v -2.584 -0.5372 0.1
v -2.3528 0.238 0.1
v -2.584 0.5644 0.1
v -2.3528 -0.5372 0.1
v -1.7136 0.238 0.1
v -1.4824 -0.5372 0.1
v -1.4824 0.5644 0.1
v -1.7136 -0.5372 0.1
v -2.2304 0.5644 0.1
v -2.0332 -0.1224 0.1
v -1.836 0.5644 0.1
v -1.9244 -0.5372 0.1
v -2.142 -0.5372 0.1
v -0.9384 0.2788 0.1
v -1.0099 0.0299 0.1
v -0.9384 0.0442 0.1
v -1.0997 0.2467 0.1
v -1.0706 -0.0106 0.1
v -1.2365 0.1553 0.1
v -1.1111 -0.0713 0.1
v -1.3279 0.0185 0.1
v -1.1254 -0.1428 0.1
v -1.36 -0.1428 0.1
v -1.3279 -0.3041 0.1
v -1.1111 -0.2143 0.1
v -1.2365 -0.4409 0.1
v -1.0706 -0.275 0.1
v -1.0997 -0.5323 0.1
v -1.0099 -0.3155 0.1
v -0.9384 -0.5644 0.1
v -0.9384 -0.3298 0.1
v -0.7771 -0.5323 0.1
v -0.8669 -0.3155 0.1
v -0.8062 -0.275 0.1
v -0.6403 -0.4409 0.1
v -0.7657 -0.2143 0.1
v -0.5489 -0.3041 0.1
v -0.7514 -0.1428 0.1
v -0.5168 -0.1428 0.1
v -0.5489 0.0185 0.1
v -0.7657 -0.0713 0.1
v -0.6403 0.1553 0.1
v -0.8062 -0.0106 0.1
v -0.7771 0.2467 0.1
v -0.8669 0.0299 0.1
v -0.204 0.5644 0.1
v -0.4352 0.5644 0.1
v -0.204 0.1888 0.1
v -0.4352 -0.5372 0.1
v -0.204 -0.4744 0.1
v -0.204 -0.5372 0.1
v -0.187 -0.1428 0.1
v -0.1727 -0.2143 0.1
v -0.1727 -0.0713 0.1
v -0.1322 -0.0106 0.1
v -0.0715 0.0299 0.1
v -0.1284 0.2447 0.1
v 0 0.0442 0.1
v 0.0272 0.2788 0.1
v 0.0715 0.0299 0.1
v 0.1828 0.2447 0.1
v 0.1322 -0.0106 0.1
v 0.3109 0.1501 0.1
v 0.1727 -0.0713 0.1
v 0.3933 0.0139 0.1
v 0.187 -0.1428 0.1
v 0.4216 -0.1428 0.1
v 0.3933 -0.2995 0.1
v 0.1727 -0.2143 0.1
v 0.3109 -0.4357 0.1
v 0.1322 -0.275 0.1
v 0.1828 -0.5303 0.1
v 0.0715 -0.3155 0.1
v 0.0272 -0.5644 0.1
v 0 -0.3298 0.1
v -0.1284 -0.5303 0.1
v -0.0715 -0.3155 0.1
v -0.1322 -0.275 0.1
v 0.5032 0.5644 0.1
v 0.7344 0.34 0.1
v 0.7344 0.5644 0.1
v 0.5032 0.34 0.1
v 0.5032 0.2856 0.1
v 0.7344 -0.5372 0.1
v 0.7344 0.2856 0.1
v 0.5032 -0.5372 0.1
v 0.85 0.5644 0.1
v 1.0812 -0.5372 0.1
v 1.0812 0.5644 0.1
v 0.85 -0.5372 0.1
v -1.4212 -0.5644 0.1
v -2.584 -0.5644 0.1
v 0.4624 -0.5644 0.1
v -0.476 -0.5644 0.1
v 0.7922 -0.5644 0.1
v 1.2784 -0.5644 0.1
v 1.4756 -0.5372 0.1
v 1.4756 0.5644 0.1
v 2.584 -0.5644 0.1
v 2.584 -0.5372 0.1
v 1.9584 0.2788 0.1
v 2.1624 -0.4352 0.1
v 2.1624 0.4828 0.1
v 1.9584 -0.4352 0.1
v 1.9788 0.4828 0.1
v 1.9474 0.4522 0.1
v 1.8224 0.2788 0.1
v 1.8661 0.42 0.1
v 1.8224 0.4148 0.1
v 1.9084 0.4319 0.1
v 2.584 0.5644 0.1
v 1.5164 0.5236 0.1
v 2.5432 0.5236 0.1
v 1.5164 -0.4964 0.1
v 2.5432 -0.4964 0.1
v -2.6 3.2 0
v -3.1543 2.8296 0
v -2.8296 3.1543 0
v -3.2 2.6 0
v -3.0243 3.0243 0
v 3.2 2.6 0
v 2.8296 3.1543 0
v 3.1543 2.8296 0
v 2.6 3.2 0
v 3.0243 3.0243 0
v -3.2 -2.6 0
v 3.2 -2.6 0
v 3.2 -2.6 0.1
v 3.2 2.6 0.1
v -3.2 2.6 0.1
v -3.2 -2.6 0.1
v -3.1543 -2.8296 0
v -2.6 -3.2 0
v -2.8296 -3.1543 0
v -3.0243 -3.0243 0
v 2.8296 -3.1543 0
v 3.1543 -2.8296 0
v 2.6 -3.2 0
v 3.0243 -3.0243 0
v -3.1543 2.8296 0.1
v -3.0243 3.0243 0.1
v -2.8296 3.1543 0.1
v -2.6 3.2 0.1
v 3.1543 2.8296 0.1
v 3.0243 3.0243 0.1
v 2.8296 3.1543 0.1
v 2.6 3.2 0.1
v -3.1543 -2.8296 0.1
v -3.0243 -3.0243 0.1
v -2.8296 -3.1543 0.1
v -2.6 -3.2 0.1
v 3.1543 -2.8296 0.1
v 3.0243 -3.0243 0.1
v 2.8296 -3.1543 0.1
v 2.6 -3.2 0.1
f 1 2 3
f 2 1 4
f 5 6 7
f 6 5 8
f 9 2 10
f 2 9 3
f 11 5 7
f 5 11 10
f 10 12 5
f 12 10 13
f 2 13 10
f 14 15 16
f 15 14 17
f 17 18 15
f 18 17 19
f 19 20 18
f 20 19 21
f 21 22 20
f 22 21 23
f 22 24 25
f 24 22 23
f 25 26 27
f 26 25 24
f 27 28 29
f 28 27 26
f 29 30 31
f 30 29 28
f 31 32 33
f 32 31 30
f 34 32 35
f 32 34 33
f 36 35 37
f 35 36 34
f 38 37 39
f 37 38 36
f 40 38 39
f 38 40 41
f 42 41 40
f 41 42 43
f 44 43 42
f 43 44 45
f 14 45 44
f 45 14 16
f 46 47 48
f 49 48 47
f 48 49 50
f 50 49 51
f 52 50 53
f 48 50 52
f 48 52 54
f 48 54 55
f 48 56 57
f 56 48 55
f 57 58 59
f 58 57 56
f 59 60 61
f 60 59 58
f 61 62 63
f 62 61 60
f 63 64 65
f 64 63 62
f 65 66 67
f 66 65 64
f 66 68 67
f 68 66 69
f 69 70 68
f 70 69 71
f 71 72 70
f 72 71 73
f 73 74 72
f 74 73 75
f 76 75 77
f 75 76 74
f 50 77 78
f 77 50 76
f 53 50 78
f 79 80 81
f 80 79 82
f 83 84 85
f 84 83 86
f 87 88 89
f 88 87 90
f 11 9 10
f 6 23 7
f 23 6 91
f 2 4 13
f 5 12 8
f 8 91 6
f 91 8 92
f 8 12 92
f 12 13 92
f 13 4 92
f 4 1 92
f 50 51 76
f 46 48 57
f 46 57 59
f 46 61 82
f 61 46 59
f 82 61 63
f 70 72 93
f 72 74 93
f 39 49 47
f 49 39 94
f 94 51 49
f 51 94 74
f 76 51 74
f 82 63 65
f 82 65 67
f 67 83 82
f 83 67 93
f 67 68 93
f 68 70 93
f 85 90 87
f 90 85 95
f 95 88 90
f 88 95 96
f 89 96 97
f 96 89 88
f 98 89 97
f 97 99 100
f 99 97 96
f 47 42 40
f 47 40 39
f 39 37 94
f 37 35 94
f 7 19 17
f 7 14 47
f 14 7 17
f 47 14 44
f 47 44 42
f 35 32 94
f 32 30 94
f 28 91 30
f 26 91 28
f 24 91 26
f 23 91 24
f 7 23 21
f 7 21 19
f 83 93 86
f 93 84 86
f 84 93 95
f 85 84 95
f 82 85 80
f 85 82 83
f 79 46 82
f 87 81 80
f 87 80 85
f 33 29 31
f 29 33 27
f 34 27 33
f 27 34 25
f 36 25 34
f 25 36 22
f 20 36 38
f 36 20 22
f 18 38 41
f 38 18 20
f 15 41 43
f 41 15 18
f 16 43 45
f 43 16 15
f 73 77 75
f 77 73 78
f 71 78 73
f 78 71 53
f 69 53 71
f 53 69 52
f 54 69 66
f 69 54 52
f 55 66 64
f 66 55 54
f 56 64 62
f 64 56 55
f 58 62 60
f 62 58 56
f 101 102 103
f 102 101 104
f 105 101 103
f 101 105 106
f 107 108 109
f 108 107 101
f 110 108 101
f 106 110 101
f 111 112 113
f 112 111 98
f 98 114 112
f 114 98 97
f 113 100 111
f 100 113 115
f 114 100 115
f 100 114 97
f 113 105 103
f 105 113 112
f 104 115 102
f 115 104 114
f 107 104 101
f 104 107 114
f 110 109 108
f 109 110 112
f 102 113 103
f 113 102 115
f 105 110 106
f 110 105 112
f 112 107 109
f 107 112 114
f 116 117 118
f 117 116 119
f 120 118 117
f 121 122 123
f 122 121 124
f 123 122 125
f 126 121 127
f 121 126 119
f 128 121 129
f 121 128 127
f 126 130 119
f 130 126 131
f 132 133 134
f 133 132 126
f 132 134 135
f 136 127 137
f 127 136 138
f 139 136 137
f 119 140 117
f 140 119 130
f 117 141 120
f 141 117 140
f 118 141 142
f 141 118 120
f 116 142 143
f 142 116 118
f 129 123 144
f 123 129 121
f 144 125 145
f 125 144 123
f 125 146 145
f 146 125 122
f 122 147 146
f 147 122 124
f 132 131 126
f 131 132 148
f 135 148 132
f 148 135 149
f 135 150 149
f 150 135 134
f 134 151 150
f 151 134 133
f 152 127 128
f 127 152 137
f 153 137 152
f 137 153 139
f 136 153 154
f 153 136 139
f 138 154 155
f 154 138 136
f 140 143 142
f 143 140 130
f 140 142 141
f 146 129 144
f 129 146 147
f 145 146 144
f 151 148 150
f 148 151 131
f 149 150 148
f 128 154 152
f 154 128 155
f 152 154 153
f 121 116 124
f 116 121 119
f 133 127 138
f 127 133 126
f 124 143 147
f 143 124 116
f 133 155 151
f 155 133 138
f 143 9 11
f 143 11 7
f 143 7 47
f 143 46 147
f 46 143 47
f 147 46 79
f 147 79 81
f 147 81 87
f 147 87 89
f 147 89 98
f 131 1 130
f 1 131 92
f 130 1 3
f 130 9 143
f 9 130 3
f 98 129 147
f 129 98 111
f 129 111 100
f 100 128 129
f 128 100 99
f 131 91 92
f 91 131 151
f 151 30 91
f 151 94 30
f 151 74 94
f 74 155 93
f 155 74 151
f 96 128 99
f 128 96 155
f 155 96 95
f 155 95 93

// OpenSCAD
// file: ../p/logo-mobil1-text.scad
use <../lib.scad>
function ldraw_lib__logo_mobil1_text() = [
// 0 Logo Mobil without Number Monocolor
// 0 Name: logo-mobil1-text.dat
// 0 Author: Massimo Maso [Sirio]
// 0 !LDRAW_ORG Primitive UPDATE 2025-03
// 0 !LICENSE Licensed under CC BY 4.0 : see CAreadme.txt
// 
// 0 !HELP Exact dimensions X = 3.8; Z = 0.83
// 
// 0 BFC CERTIFY CCW
  [0,"BFC","CERTIFY"],
  [0,"BFC","CCW"],
// 
// 0 !HISTORY 2025-03-30 [OrionP] Official Update 2025-03
// 
// 0 // Text "Mobil1"
// 0 // Letter "M"
// 4 16 -1.73 0 .175 -1.9 0 .415 -1.9 0 -.395 -1.73 0 -.395
  [4,16,-1.73,0,.175,-1.9,0,.415,-1.9,0,-.395,-1.73,0,-.395],
// 4 16 -1.26 0 .175 -1.26 0 -.395 -1.09 0 -.395 -1.09 0 .415
  [4,16,-1.26,0,.175,-1.26,0,-.395,-1.09,0,-.395,-1.09,0,.415],
// 4 16 -1.73 0 .175 -1.495 0 -.09 -1.64 0 .415 -1.9 0 .415
  [4,16,-1.73,0,.175,-1.495,0,-.09,-1.64,0,.415,-1.9,0,.415],
// 4 16 -1.26 0 .175 -1.09 0 .415 -1.35 0 .415 -1.495 0 -.09
  [4,16,-1.26,0,.175,-1.09,0,.415,-1.35,0,.415,-1.495,0,-.09],
// 4 16 -1.415 0 -.395 -1.26 0 .175 -1.495 0 -.09 -1.575 0 -.395
  [4,16,-1.415,0,-.395,-1.26,0,.175,-1.495,0,-.09,-1.575,0,-.395],
// 3 16 -1.73 0 .175 -1.575 0 -.395 -1.495 0 -.09
  [3,16,-1.73,0,.175,-1.575,0,-.395,-1.495,0,-.09],
// 0 // Letter "o"
// 4 16 -.69 0 .0325 -.69 0 .205 -.8086 0 .1814 -.7426 0 .022
  [4,16,-.69,0,.0325,-.69,0,.205,-.8086,0,.1814,-.7426,0,.022],
// 4 16 -.7426 0 .022 -.8086 0 .1814 -.9092 0 .1142 -.7872 0 -.0078
  [4,16,-.7426,0,.022,-.8086,0,.1814,-.9092,0,.1142,-.7872,0,-.0078],
// 4 16 -.7872 0 -.0078 -.9092 0 .1142 -.9764 0 .0136 -.817 0 -.0524
  [4,16,-.7872,0,-.0078,-.9092,0,.1142,-.9764,0,.0136,-.817,0,-.0524],
// 4 16 -.817 0 -.0524 -.9764 0 .0136 -1 0 -.105 -.8275 0 -.105
  [4,16,-.817,0,-.0524,-.9764,0,.0136,-1,0,-.105,-.8275,0,-.105],
// 4 16 -.8275 0 -.105 -1 0 -.105 -.9764 0 -.2236 -.817 0 -.1576
  [4,16,-.8275,0,-.105,-1,0,-.105,-.9764,0,-.2236,-.817,0,-.1576],
// 4 16 -.817 0 -.1576 -.9764 0 -.2236 -.9092 0 -.3242 -.7872 0 -.2022
  [4,16,-.817,0,-.1576,-.9764,0,-.2236,-.9092,0,-.3242,-.7872,0,-.2022],
// 4 16 -.7872 0 -.2022 -.9092 0 -.3242 -.8086 0 -.3914 -.7426 0 -.232
  [4,16,-.7872,0,-.2022,-.9092,0,-.3242,-.8086,0,-.3914,-.7426,0,-.232],
// 4 16 -.7426 0 -.232 -.8086 0 -.3914 -.69 0 -.415 -.69 0 -.2425
  [4,16,-.7426,0,-.232,-.8086,0,-.3914,-.69,0,-.415,-.69,0,-.2425],
// 4 16 -.69 0 -.2425 -.69 0 -.415 -.5714 0 -.3914 -.6374 0 -.232
  [4,16,-.69,0,-.2425,-.69,0,-.415,-.5714,0,-.3914,-.6374,0,-.232],
// 4 16 -.6374 0 -.232 -.5714 0 -.3914 -.4708 0 -.3242 -.5928 0 -.2022
  [4,16,-.6374,0,-.232,-.5714,0,-.3914,-.4708,0,-.3242,-.5928,0,-.2022],
// 4 16 -.5928 0 -.2022 -.4708 0 -.3242 -.4036 0 -.2236 -.563 0 -.1576
  [4,16,-.5928,0,-.2022,-.4708,0,-.3242,-.4036,0,-.2236,-.563,0,-.1576],
// 4 16 -.563 0 -.1576 -.4036 0 -.2236 -.38 0 -.105 -.5525 0 -.105
  [4,16,-.563,0,-.1576,-.4036,0,-.2236,-.38,0,-.105,-.5525,0,-.105],
// 4 16 -.5525 0 -.105 -.38 0 -.105 -.4036 0 .0136 -.563 0 -.0524
  [4,16,-.5525,0,-.105,-.38,0,-.105,-.4036,0,.0136,-.563,0,-.0524],
// 4 16 -.563 0 -.0524 -.4036 0 .0136 -.4708 0 .1142 -.5928 0 -.0078
  [4,16,-.563,0,-.0524,-.4036,0,.0136,-.4708,0,.1142,-.5928,0,-.0078],
// 4 16 -.5928 0 -.0078 -.4708 0 .1142 -.5714 0 .1814 -.6374 0 .022
  [4,16,-.5928,0,-.0078,-.4708,0,.1142,-.5714,0,.1814,-.6374,0,.022],
// 4 16 -.6374 0 .022 -.5714 0 .1814 -.69 0 .205 -.69 0 .0325
  [4,16,-.6374,0,.022,-.5714,0,.1814,-.69,0,.205,-.69,0,.0325],
// 0 // Letter "b"
// 3 16 -.15 0 .415 -.32 0 .415 -.15 0 .1388
  [3,16,-.15,0,.415,-.32,0,.415,-.15,0,.1388],
// 4 16 -.32 0 .415 -.32 0 -.395 -.15 0 -.3488 -.15 0 .1388
  [4,16,-.32,0,.415,-.32,0,-.395,-.15,0,-.3488,-.15,0,.1388],
// 3 16 -.15 0 -.3488 -.32 0 -.395 -.15 0 -.395
  [3,16,-.15,0,-.3488,-.32,0,-.395,-.15,0,-.395],
// 3 16 -.1375 0 -.105 -.15 0 -.3488 -.127 0 -.1576
  [3,16,-.1375,0,-.105,-.15,0,-.3488,-.127,0,-.1576],
// 3 16 -.15 0 .1388 -.15 0 -.3488 -.1375 0 -.105
  [3,16,-.15,0,.1388,-.15,0,-.3488,-.1375,0,-.105],
// 3 16 -.15 0 .1388 -.1375 0 -.105 -.127 0 -.0524
  [3,16,-.15,0,.1388,-.1375,0,-.105,-.127,0,-.0524],
// 3 16 -.15 0 .1388 -.127 0 -.0524 -.0972 0 -.0078
  [3,16,-.15,0,.1388,-.127,0,-.0524,-.0972,0,-.0078],
// 4 16 -.15 0 .1388 -.0972 0 -.0078 -.0526 0 .022 -.0944 0 .1799
  [4,16,-.15,0,.1388,-.0972,0,-.0078,-.0526,0,.022,-.0944,0,.1799],
// 4 16 -.0944 0 .1799 -.0526 0 .022 0 0 .0325 .02 0 .205
  [4,16,-.0944,0,.1799,-.0526,0,.022,0,0,.0325,.02,0,.205],
// 4 16 .02 0 .205 0 0 .0325 .0526 0 .022 .1344 0 .1799
  [4,16,.02,0,.205,0,0,.0325,.0526,0,.022,.1344,0,.1799],
// 4 16 .1344 0 .1799 .0526 0 .022 .0972 0 -.0078 .2286 0 .1104
  [4,16,.1344,0,.1799,.0526,0,.022,.0972,0,-.0078,.2286,0,.1104],
// 4 16 .2286 0 .1104 .0972 0 -.0078 .127 0 -.0524 .2892 0 .0102
  [4,16,.2286,0,.1104,.0972,0,-.0078,.127,0,-.0524,.2892,0,.0102],
// 4 16 .2892 0 .0102 .127 0 -.0524 .1375 0 -.105 .31 0 -.105
  [4,16,.2892,0,.0102,.127,0,-.0524,.1375,0,-.105,.31,0,-.105],
// 4 16 .31 0 -.105 .1375 0 -.105 .127 0 -.1576 .2892 0 -.2202
  [4,16,.31,0,-.105,.1375,0,-.105,.127,0,-.1576,.2892,0,-.2202],
// 4 16 .2892 0 -.2202 .127 0 -.1576 .0972 0 -.2022 .2286 0 -.3204
  [4,16,.2892,0,-.2202,.127,0,-.1576,.0972,0,-.2022,.2286,0,-.3204],
// 4 16 .2286 0 -.3204 .0972 0 -.2022 .0526 0 -.232 .1344 0 -.3899
  [4,16,.2286,0,-.3204,.0972,0,-.2022,.0526,0,-.232,.1344,0,-.3899],
// 4 16 .1344 0 -.3899 .0526 0 -.232 0 0 -.2425 .02 0 -.415
  [4,16,.1344,0,-.3899,.0526,0,-.232,0,0,-.2425,.02,0,-.415],
// 4 16 .02 0 -.415 0 0 -.2425 -.0526 0 -.232 -.0944 0 -.3899
  [4,16,.02,0,-.415,0,0,-.2425,-.0526,0,-.232,-.0944,0,-.3899],
// 4 16 -.0944 0 -.3899 -.0526 0 -.232 -.0972 0 -.2022 -.15 0 -.3488
  [4,16,-.0944,0,-.3899,-.0526,0,-.232,-.0972,0,-.2022,-.15,0,-.3488],
// 3 16 -.127 0 -.1576 -.15 0 -.3488 -.0972 0 -.2022
  [3,16,-.127,0,-.1576,-.15,0,-.3488,-.0972,0,-.2022],
// 0 // Letter "i"
// 4 16 .37 0 .415 .37 0 .25 .54 0 .25 .54 0 .415
  [4,16,.37,0,.415,.37,0,.25,.54,0,.25,.54,0,.415],
// 4 16 .37 0 .21 .37 0 -.395 .54 0 -.395 .54 0 .21
  [4,16,.37,0,.21,.37,0,-.395,.54,0,-.395,.54,0,.21],
// 0 // Letter "l"
// 4 16 .625 0 .415 .625 0 -.395 .795 0 -.395 .795 0 .415
  [4,16,.625,0,.415,.625,0,-.395,.795,0,-.395,.795,0,.415],
];
module ldraw_lib__logo_mobil1_text(step=0, col=false, unit=2/5, alt=false, line=0.2, solid=!$preview)
    makepoly(ldraw_lib__logo_mobil1_text(), step=step, col=col, unit=unit, alt=alt, line=line, solid=solid);
ldraw_lib__logo_mobil1_text(line=0.2);
// file: ../p/logo-mobil1-number.scad
use <../lib.scad>
function ldraw_lib__logo_mobil1_number() = [
// 0 Logo Mobil -  1 and Frame Monocolor
// 0 Name: logo-mobil1-number.dat
// 0 Author: Massimo Maso [Sirio]
// 0 !LDRAW_ORG Primitive UPDATE 2025-03
// 0 !LICENSE Licensed under CC BY 4.0 : see CAreadme.txt
// 
// 0 !HELP Exact dimensions X = 3.8; Z = 0.83
// 
// 0 BFC CERTIFY CCW
  [0,"BFC","CERTIFY"],
  [0,"BFC","CCW"],
// 
// 0 !HISTORY 2025-03-30 [OrionP] Official Update 2025-03
// 
// 0 // Number "1"
// 4 16 1.44 0 .205 1.44 0 -.32 1.59 0 -.32 1.59 0 .355
  [4,16,1.44,0,.205,1.44,0,-.32,1.59,0,-.32,1.59,0,.355],
// 4 16 1.44 0 .205 1.59 0 .355 1.455 0 .355 1.4319 0 .3325
  [4,16,1.44,0,.205,1.59,0,.355,1.455,0,.355,1.4319,0,.3325],
// 4 16 1.3721 0 .3088 1.34 0 .305 1.34 0 .205 1.44 0 .205
  [4,16,1.3721,0,.3088,1.34,0,.305,1.34,0,.205,1.44,0,.205],
// 3 16 1.4032 0 .3176 1.3721 0 .3088 1.44 0 .205
  [3,16,1.4032,0,.3176,1.3721,0,.3088,1.44,0,.205],
// 3 16 1.4319 0 .3325 1.4032 0 .3176 1.44 0 .205
  [3,16,1.4319,0,.3325,1.4032,0,.3176,1.44,0,.205],
// 0 // Frame
// 4 16 1.085 0 .415 1.115 0 .385 1.87 0 .385 1.9 0 .415
  [4,16,1.085,0,.415,1.115,0,.385,1.87,0,.385,1.9,0,.415],
// 4 16 1.085 0 .415 1.085 0 -.395 1.115 0 -.365 1.115 0 .385
  [4,16,1.085,0,.415,1.085,0,-.395,1.115,0,-.365,1.115,0,.385],
// 4 16 1.9 0 -.395 1.9 0 .415 1.87 0 .385 1.87 0 -.365
  [4,16,1.9,0,-.395,1.9,0,.415,1.87,0,.385,1.87,0,-.365],
// 4 16 1.9 0 -.395 1.87 0 -.365 1.115 0 -.365 1.085 0 -.395
  [4,16,1.9,0,-.395,1.87,0,-.365,1.115,0,-.365,1.085,0,-.395],
];
module ldraw_lib__logo_mobil1_number(step=0, col=false, unit=2/5, alt=false, line=0.2, solid=!$preview)
    makepoly(ldraw_lib__logo_mobil1_number(), step=step, col=col, unit=unit, alt=alt, line=line, solid=solid);
ldraw_lib__logo_mobil1_number(line=0.2);
// file: ../p/logo-mobil1-number-box.scad
use <../lib.scad>
function ldraw_lib__logo_mobil1_number_box() = [
// 0 Logo Mobil Box for Number  1
// 0 Name: logo-mobil1-number-box.dat
// 0 Author: Massimo Maso [Sirio]
// 0 !LDRAW_ORG Primitive UPDATE 2025-03
// 0 !LICENSE Licensed under CC BY 4.0 : see CAreadme.txt
// 
// 0 !HELP Exact dimensions X = 3.8; Z = 0.83
// 
// 0 BFC CERTIFY CCW
  [0,"BFC","CERTIFY"],
  [0,"BFC","CCW"],
// 
// 0 !HISTORY 2025-03-30 [OrionP] Official Update 2025-03
// 
// 0 // Inner rectangle
// 4 16 1.87 0 .385 1.115 0 .385 1.455 0 .355 1.59 0 .355
  [4,16,1.87,0,.385,1.115,0,.385,1.455,0,.355,1.59,0,.355],
// 4 16 1.44 0 -.32 1.115 0 -.365 1.87 0 -.365 1.59 0 -.32
  [4,16,1.44,0,-.32,1.115,0,-.365,1.87,0,-.365,1.59,0,-.32],
// 4 16 1.44 0 -.32 1.44 0 .205 1.34 0 .205 1.115 0 -.365
  [4,16,1.44,0,-.32,1.44,0,.205,1.34,0,.205,1.115,0,-.365],
// 4 16 1.115 0 .385 1.34 0 .305 1.3721 0 .3088 1.4032 0 .3176
  [4,16,1.115,0,.385,1.34,0,.305,1.3721,0,.3088,1.4032,0,.3176],
// 4 16 1.87 0 .385 1.59 0 .355 1.59 0 -.32 1.87 0 -.365
  [4,16,1.87,0,.385,1.59,0,.355,1.59,0,-.32,1.87,0,-.365],
// 4 16 1.115 0 .385 1.4032 0 .3176 1.4319 0 .3325 1.455 0 .355
  [4,16,1.115,0,.385,1.4032,0,.3176,1.4319,0,.3325,1.455,0,.355],
// 4 16 1.34 0 .205 1.34 0 .305 1.115 0 .385 1.115 0 -.365
  [4,16,1.34,0,.205,1.34,0,.305,1.115,0,.385,1.115,0,-.365],
];
module ldraw_lib__logo_mobil1_number_box(step=0, col=false, unit=2/5, alt=false, line=0.2, solid=!$preview)
    makepoly(ldraw_lib__logo_mobil1_number_box(), step=step, col=col, unit=unit, alt=alt, line=line, solid=solid);
ldraw_lib__logo_mobil1_number_box(line=0.2);
// file: ../p/box3u12.scad
use <../lib.scad>
function ldraw_lib__box3u12() = [
// 0 Box with 3 Parallel Faces without Any Edges
// 0 Name: box3u12.dat
// 0 Author: J.C. Tchang [tchang]
// 0 !LDRAW_ORG Primitive UPDATE 2014-02
// 0 !LICENSE Licensed under CC BY 4.0 : see CAreadme.txt
// 
// 0 BFC CERTIFY CCW
  [0,"BFC","CERTIFY"],
  [0,"BFC","CCW"],
// 
// 0 !HISTORY 2014-12-23 [PTadmin] Official Update 2014-02
// 
// 
// 4 16 -1 1 1 1 1 1 1 1 -1 -1 1 -1
  [4,16,-1,1,1,1,1,1,1,1,-1,-1,1,-1],
// 4 16 -1 1 1 -1 0 1 1 0 1 1 1 1
  [4,16,-1,1,1,-1,0,1,1,0,1,1,1,1],
// 4 16 1 1 -1 1 0 -1 -1 0 -1 -1 1 -1
  [4,16,1,1,-1,1,0,-1,-1,0,-1,-1,1,-1],
];
module ldraw_lib__box3u12(step=0, col=false, unit=2/5, alt=false, line=0.2, solid=!$preview)
    makepoly(ldraw_lib__box3u12(), step=step, col=col, unit=unit, alt=alt, line=line, solid=solid);
ldraw_lib__box3u12(line=0.2);
// file: ../p/1-4cyli.scad
use <../lib.scad>
function ldraw_lib__1_4cyli() = [
// 0 Cylinder 0.25
// 0 Name: 1-4cyli.dat
// 0 Author: James Jessiman
// 0 !LDRAW_ORG Primitive UPDATE 2012-01
// 0 !LICENSE Licensed under CC BY 4.0 : see CAreadme.txt
// 
// 0 BFC CERTIFY CCW
  [0,"BFC","CERTIFY"],
  [0,"BFC","CCW"],
// 
// 0 !HISTORY 2002-03-23 [sbliss] Added BFC statement.
// 0 !HISTORY 2002-04-25 [PTadmin] Official Update 2002-02
// 0 !HISTORY 2007-06-22 [PTadmin] Header formatted for Contributor Agreement
// 0 !HISTORY 2008-07-01 [PTadmin] Official Update 2008-01
// 0 !HISTORY 2012-02-16 [Philo] Changed to CCW
// 0 !HISTORY 2012-03-30 [PTadmin] Official Update 2012-01
// 
// 
// 4 16 1 1 0 0.9239 1 0.3827 0.9239 0 0.3827 1 0 0
  [4,16,1,1,0,0.9239,1,0.3827,0.9239,0,0.3827,1,0,0],
// 5 24 1 0 0 1 1 0 0.9239 0 0.3827 1 0 -1
  [5,24,1,0,0,1,1,0,0.9239,0,0.3827,1,0,-1],
// 4 16 0.9239 1 0.3827 0.7071 1 0.7071 0.7071 0 0.7071 0.9239 0 0.3827
  [4,16,0.9239,1,0.3827,0.7071,1,0.7071,0.7071,0,0.7071,0.9239,0,0.3827],
// 5 24 0.9239 0 0.3827 0.9239 1 0.3827 0.7071 0 0.7071 1 0 0
  [5,24,0.9239,0,0.3827,0.9239,1,0.3827,0.7071,0,0.7071,1,0,0],
// 4 16 0.7071 1 0.7071 0.3827 1 0.9239 0.3827 0 0.9239 0.7071 0 0.7071
  [4,16,0.7071,1,0.7071,0.3827,1,0.9239,0.3827,0,0.9239,0.7071,0,0.7071],
// 5 24 0.7071 0 0.7071 0.7071 1 0.7071 0.3827 0 0.9239 0.9239 0 0.3827
  [5,24,0.7071,0,0.7071,0.7071,1,0.7071,0.3827,0,0.9239,0.9239,0,0.3827],
// 4 16 0.3827 1 0.9239 0 1 1 0 0 1 0.3827 0 0.9239
  [4,16,0.3827,1,0.9239,0,1,1,0,0,1,0.3827,0,0.9239],
// 5 24 0.3827 0 0.9239 0.3827 1 0.9239 0 0 1 0.7071 0 0.7071
  [5,24,0.3827,0,0.9239,0.3827,1,0.9239,0,0,1,0.7071,0,0.7071],
// 5 24 0 0 1 0 1 1 0.3827 0 0.9239 -1 0 1
  [5,24,0,0,1,0,1,1,0.3827,0,0.9239,-1,0,1],
];
module ldraw_lib__1_4cyli(step=0, col=false, unit=2/5, alt=false, line=0.2, solid=!$preview)
    makepoly(ldraw_lib__1_4cyli(), step=step, col=col, unit=unit, alt=alt, line=line, solid=solid);
ldraw_lib__1_4cyli(line=0.2);
// file: ../p/1-4chrd.scad
use <../lib.scad>
function ldraw_lib__1_4chrd() = [
// 0 Chord 0.25
// 0 Name: 1-4chrd.dat
// 0 Author: Max Martin Richter [MMR1988]
// 0 !LDRAW_ORG Primitive UPDATE 2023-05
// 0 !LICENSE Licensed under CC BY 4.0 : see CAreadme.txt
// 
// 0 BFC CERTIFY CCW
  [0,"BFC","CERTIFY"],
  [0,"BFC","CCW"],
// 
// 0 !HISTORY 2004-04-22 [PTadmin] Official Update 2004-02
// 0 !HISTORY 2007-10-09 [PTadmin] Header formatted for Contributor Agreement
// 0 !HISTORY 2008-07-01 [PTadmin] Official Update 2008-01
// 0 !HISTORY 2012-08-02 [MMR1988] Re-creation with PrimGen2 and Rectifier
// 0 !HISTORY 2012-08-09 [PTadmin] Official Update 2012-02
// 0 !HISTORY 2023-10-27 [OrionP] Change author to MMR1988 from hafhead
// 0 !HISTORY 2023-10-31 [OrionP] Official Update 2023-05
// 
// 4 16 0.9239 0 0.3827 0.3827 0 0.9239 0 0 1 1 0 0
  [4,16,0.9239,0,0.3827,0.3827,0,0.9239,0,0,1,1,0,0],
// 3 16 0.7071 0 0.7071 0.3827 0 0.9239 0.9239 0 0.3827
  [3,16,0.7071,0,0.7071,0.3827,0,0.9239,0.9239,0,0.3827],
];
module ldraw_lib__1_4chrd(step=0, col=false, unit=2/5, alt=false, line=0.2, solid=!$preview)
    makepoly(ldraw_lib__1_4chrd(), step=step, col=col, unit=unit, alt=alt, line=line, solid=solid);
ldraw_lib__1_4chrd(line=0.2);
// main file
use <../lib.scad>
use <../p/1-4chrd.scad>
use <../p/1-4cyli.scad>
use <../p/box3u12.scad>
use <../p/logo-mobil1-number-box.scad>
use <../p/logo-mobil1-number.scad>
use <../p/logo-mobil1-text-box.scad>
use <../p/logo-mobil1-text.scad>
function ldraw_lib__6221657f() = [
// 0 Sticker  0.8 x  0.8 with White Logo Mobil on Black Background
// 0 Name: 6221657f.dat
// 0 Author: Massimo Maso [Sirio]
// 0 !LDRAW_ORG Part UPDATE 2025-03
// 0 !LICENSE Licensed under CC BY 4.0 : see CAreadme.txt
// 
// 0 BFC CERTIFY CCW
  [0,"BFC","CERTIFY"],
  [0,"BFC","CCW"],
// 
// 0 !KEYWORDS 919, Brendon Hartley, Earl Bamber, Hybrid, LMP, Motorsport, Porsche
// 0 !KEYWORDS Set 75887, Speed Champions, Team, Timo Bernhard
// 
// 0 !HISTORY 2025-03-30 [OrionP] Official Update 2025-03
// 
// 0 // Logo primitives
// 1 15 0 -.25 0 3.4 0 0 0 1 0 0 0 3.4 logo-mobil1-text.dat
  [1,15,0,-.25,0,3.4,0,0,0,1,0,0,0,3.4, ldraw_lib__logo_mobil1_text()],
// 1 0 0 -.25 0 3.4 0 0 0 1 0 0 0 3.4 logo-mobil1-text-box.dat
  [1,0,0,-.25,0,3.4,0,0,0,1,0,0,0,3.4, ldraw_lib__logo_mobil1_text_box()],
// 1 15 0 -.25 0 3.4 0 0 0 1 0 0 0 3.4 logo-mobil1-number.dat
  [1,15,0,-.25,0,3.4,0,0,0,1,0,0,0,3.4, ldraw_lib__logo_mobil1_number()],
// 1 0 0 -.25 0 3.4 0 0 0 1 0 0 0 3.4 logo-mobil1-number-box.dat
  [1,0,0,-.25,0,3.4,0,0,0,1,0,0,0,3.4, ldraw_lib__logo_mobil1_number_box()],
// 0 // Primitives
// 1 16 -6.5 0 6.5 -1.5 0 0 0 -1 0 0 0 1.5 1-4chrd.dat
  [1,16,-6.5,0,6.5,-1.5,0,0,0,-1,0,0,0,1.5, ldraw_lib__1_4chrd()],
// 1 16 6.5 0 6.5 1.5 0 0 0 -1 0 0 0 1.5 1-4chrd.dat
  [1,16,6.5,0,6.5,1.5,0,0,0,-1,0,0,0,1.5, ldraw_lib__1_4chrd()],
// 1 16 0 -.25 0 0 0 8 0 .25 0 6.5 0 0 box3u12.dat
  [1,16,0,-.25,0,0,0,8,0,.25,0,6.5,0,0, ldraw_lib__box3u12()],
// 1 16 -6.5 0 -6.5 -1.5 0 0 0 -1 0 0 0 -1.5 1-4chrd.dat
  [1,16,-6.5,0,-6.5,-1.5,0,0,0,-1,0,0,0,-1.5, ldraw_lib__1_4chrd()],
// 1 16 6.5 0 -6.5 1.5 0 0 0 -1 0 0 0 -1.5 1-4chrd.dat
  [1,16,6.5,0,-6.5,1.5,0,0,0,-1,0,0,0,-1.5, ldraw_lib__1_4chrd()],
// 1 16 -6.5 0 6.5 -1.5 0 0 0 -.25 0 0 0 1.5 1-4cyli.dat
  [1,16,-6.5,0,6.5,-1.5,0,0,0,-.25,0,0,0,1.5, ldraw_lib__1_4cyli()],
// 1 16 6.5 0 6.5 1.5 0 0 0 -.25 0 0 0 1.5 1-4cyli.dat
  [1,16,6.5,0,6.5,1.5,0,0,0,-.25,0,0,0,1.5, ldraw_lib__1_4cyli()],
// 1 16 -6.5 0 -6.5 -1.5 0 0 0 -.25 0 0 0 -1.5 1-4cyli.dat
  [1,16,-6.5,0,-6.5,-1.5,0,0,0,-.25,0,0,0,-1.5, ldraw_lib__1_4cyli()],
// 1 16 6.5 0 -6.5 1.5 0 0 0 -.25 0 0 0 -1.5 1-4cyli.dat
  [1,16,6.5,0,-6.5,1.5,0,0,0,-.25,0,0,0,-1.5, ldraw_lib__1_4cyli()],
// 1 0 -6.5 -.25 6.5 -1.5 0 0 0 1 0 0 0 1.5 1-4chrd.dat
  [1,0,-6.5,-.25,6.5,-1.5,0,0,0,1,0,0,0,1.5, ldraw_lib__1_4chrd()],
// 1 0 6.5 -.25 6.5 1.5 0 0 0 1 0 0 0 1.5 1-4chrd.dat
  [1,0,6.5,-.25,6.5,1.5,0,0,0,1,0,0,0,1.5, ldraw_lib__1_4chrd()],
// 1 0 -6.5 -.25 -6.5 -1.5 0 0 0 1 0 0 0 -1.5 1-4chrd.dat
  [1,0,-6.5,-.25,-6.5,-1.5,0,0,0,1,0,0,0,-1.5, ldraw_lib__1_4chrd()],
// 1 0 6.5 -.25 -6.5 1.5 0 0 0 1 0 0 0 -1.5 1-4chrd.dat
  [1,0,6.5,-.25,-6.5,1.5,0,0,0,1,0,0,0,-1.5, ldraw_lib__1_4chrd()],
// 0 // Bottom faces
// 4 16 6.5 0 8 8 0 6.5 -8 0 6.5 -6.5 0 8
  [4,16,6.5,0,8,8,0,6.5,-8,0,6.5,-6.5,0,8],
// 4 16 6.5 0 -8 -6.5 0 -8 -8 0 -6.5 8 0 -6.5
  [4,16,6.5,0,-8,-6.5,0,-8,-8,0,-6.5,8,0,-6.5],
// 0 // Lateral faces
// 4 16 -6.5 0 8 -6.5 -.25 8 6.5 -.25 8 6.5 0 8
  [4,16,-6.5,0,8,-6.5,-.25,8,6.5,-.25,8,6.5,0,8],
// 4 16 -6.5 0 -8 6.5 0 -8 6.5 -.25 -8 -6.5 -.25 -8
  [4,16,-6.5,0,-8,6.5,0,-8,6.5,-.25,-8,-6.5,-.25,-8],
// 0 // Top faces
// 0 // Black faces
// 3 0 -6.5 -.25 8 -5.576 -.25 1.411 -4.59 -.25 1.411
  [3,0,-6.5,-.25,8,-5.576,-.25,1.411,-4.59,-.25,1.411],
// 3 0 -6.5 -.25 8 -4.59 -.25 1.411 -3.706 -.25 1.411
  [3,0,-6.5,-.25,8,-4.59,-.25,1.411,-3.706,-.25,1.411],
// 3 0 -6.5 -.25 8 -3.706 -.25 1.411 -1.088 -.25 1.411
  [3,0,-6.5,-.25,8,-3.706,-.25,1.411,-1.088,-.25,1.411],
// 4 0 -6.5 -.25 8 -1.088 -.25 1.411 -.51 -.25 1.411 6.5 -.25 8
  [4,0,-6.5,-.25,8,-1.088,-.25,1.411,-.51,-.25,1.411,6.5,-.25,8],
// 3 0 6.5 -.25 8 -.51 -.25 1.411 1.258 -.25 1.411
  [3,0,6.5,-.25,8,-.51,-.25,1.411,1.258,-.25,1.411],
// 3 0 6.5 -.25 8 1.258 -.25 1.411 1.836 -.25 1.411
  [3,0,6.5,-.25,8,1.258,-.25,1.411,1.836,-.25,1.411],
// 3 0 6.5 -.25 8 1.836 -.25 1.411 2.125 -.25 1.411
  [3,0,6.5,-.25,8,1.836,-.25,1.411,2.125,-.25,1.411],
// 3 0 6.5 -.25 8 2.125 -.25 1.411 2.703 -.25 1.411
  [3,0,6.5,-.25,8,2.125,-.25,1.411,2.703,-.25,1.411],
// 3 0 6.5 -.25 8 2.703 -.25 1.411 3.689 -.25 1.411
  [3,0,6.5,-.25,8,2.703,-.25,1.411,3.689,-.25,1.411],
// 4 0 -8 -.25 6.5 -8 -.25 -6.5 -6.46 -.25 -1.411 -6.46 -.25 -1.343
  [4,0,-8,-.25,6.5,-8,-.25,-6.5,-6.46,-.25,-1.411,-6.46,-.25,-1.343],
// 3 0 -8 -.25 6.5 -6.46 -.25 -1.343 -6.46 -.25 1.411
  [3,0,-8,-.25,6.5,-6.46,-.25,-1.343,-6.46,-.25,1.411],
// 4 0 -8 -.25 6.5 -6.46 -.25 1.411 -5.576 -.25 1.411 -6.5 -.25 8
  [4,0,-8,-.25,6.5,-6.46,-.25,1.411,-5.576,-.25,1.411,-6.5,-.25,8],
// 4 0 8 -.25 6.5 6.5 -.25 8 3.689 -.25 1.411 6.46 -.25 1.411
  [4,0,8,-.25,6.5,6.5,-.25,8,3.689,-.25,1.411,6.46,-.25,1.411],
// 3 0 8 -.25 6.5 6.46 -.25 1.411 6.46 -.25 -1.343
  [3,0,8,-.25,6.5,6.46,-.25,1.411,6.46,-.25,-1.343],
// 4 0 8 -.25 6.5 6.46 -.25 -1.343 6.46 -.25 -1.411 8 -.25 -6.5
  [4,0,8,-.25,6.5,6.46,-.25,-1.343,6.46,-.25,-1.411,8,-.25,-6.5],
// 4 0 -6.5 -.25 -8 -3.553 -.25 -1.411 -6.46 -.25 -1.411 -8 -.25 -6.5
  [4,0,-6.5,-.25,-8,-3.553,-.25,-1.411,-6.46,-.25,-1.411,-8,-.25,-6.5],
// 3 0 -6.5 -.25 -8 -2.346 -.25 -1.411 -3.553 -.25 -1.411
  [3,0,-6.5,-.25,-8,-2.346,-.25,-1.411,-3.553,-.25,-1.411],
// 3 0 -6.5 -.25 -8 -1.19 -.25 -1.411 -2.346 -.25 -1.411
  [3,0,-6.5,-.25,-8,-1.19,-.25,-1.411,-2.346,-.25,-1.411],
// 3 0 -6.5 -.25 -8 .068 -.25 -1.411 -1.19 -.25 -1.411
  [3,0,-6.5,-.25,-8,.068,-.25,-1.411,-1.19,-.25,-1.411],
// 4 0 -6.5 -.25 -8 6.5 -.25 -8 1.156 -.25 -1.411 .068 -.25 -1.411
  [4,0,-6.5,-.25,-8,6.5,-.25,-8,1.156,-.25,-1.411,.068,-.25,-1.411],
// 4 0 6.5 -.25 -8 8 -.25 -6.5 6.46 -.25 -1.411 3.196 -.25 -1.411
  [4,0,6.5,-.25,-8,8,-.25,-6.5,6.46,-.25,-1.411,3.196,-.25,-1.411],
// 3 0 6.5 -.25 -8 3.196 -.25 -1.411 1.9805 -.25 -1.411
  [3,0,6.5,-.25,-8,3.196,-.25,-1.411,1.9805,-.25,-1.411],
// 3 0 6.5 -.25 -8 1.9805 -.25 -1.411 1.156 -.25 -1.411
  [3,0,6.5,-.25,-8,1.9805,-.25,-1.411,1.156,-.25,-1.411],
];
module ldraw_lib__6221657f(step=0, col=false, unit=2/5, alt=false, line=0.2, solid=!$preview)
    makepoly(ldraw_lib__6221657f(), step=step, col=col, unit=unit, alt=alt, line=line, solid=solid);
ldraw_lib__6221657f(line=0.2);
